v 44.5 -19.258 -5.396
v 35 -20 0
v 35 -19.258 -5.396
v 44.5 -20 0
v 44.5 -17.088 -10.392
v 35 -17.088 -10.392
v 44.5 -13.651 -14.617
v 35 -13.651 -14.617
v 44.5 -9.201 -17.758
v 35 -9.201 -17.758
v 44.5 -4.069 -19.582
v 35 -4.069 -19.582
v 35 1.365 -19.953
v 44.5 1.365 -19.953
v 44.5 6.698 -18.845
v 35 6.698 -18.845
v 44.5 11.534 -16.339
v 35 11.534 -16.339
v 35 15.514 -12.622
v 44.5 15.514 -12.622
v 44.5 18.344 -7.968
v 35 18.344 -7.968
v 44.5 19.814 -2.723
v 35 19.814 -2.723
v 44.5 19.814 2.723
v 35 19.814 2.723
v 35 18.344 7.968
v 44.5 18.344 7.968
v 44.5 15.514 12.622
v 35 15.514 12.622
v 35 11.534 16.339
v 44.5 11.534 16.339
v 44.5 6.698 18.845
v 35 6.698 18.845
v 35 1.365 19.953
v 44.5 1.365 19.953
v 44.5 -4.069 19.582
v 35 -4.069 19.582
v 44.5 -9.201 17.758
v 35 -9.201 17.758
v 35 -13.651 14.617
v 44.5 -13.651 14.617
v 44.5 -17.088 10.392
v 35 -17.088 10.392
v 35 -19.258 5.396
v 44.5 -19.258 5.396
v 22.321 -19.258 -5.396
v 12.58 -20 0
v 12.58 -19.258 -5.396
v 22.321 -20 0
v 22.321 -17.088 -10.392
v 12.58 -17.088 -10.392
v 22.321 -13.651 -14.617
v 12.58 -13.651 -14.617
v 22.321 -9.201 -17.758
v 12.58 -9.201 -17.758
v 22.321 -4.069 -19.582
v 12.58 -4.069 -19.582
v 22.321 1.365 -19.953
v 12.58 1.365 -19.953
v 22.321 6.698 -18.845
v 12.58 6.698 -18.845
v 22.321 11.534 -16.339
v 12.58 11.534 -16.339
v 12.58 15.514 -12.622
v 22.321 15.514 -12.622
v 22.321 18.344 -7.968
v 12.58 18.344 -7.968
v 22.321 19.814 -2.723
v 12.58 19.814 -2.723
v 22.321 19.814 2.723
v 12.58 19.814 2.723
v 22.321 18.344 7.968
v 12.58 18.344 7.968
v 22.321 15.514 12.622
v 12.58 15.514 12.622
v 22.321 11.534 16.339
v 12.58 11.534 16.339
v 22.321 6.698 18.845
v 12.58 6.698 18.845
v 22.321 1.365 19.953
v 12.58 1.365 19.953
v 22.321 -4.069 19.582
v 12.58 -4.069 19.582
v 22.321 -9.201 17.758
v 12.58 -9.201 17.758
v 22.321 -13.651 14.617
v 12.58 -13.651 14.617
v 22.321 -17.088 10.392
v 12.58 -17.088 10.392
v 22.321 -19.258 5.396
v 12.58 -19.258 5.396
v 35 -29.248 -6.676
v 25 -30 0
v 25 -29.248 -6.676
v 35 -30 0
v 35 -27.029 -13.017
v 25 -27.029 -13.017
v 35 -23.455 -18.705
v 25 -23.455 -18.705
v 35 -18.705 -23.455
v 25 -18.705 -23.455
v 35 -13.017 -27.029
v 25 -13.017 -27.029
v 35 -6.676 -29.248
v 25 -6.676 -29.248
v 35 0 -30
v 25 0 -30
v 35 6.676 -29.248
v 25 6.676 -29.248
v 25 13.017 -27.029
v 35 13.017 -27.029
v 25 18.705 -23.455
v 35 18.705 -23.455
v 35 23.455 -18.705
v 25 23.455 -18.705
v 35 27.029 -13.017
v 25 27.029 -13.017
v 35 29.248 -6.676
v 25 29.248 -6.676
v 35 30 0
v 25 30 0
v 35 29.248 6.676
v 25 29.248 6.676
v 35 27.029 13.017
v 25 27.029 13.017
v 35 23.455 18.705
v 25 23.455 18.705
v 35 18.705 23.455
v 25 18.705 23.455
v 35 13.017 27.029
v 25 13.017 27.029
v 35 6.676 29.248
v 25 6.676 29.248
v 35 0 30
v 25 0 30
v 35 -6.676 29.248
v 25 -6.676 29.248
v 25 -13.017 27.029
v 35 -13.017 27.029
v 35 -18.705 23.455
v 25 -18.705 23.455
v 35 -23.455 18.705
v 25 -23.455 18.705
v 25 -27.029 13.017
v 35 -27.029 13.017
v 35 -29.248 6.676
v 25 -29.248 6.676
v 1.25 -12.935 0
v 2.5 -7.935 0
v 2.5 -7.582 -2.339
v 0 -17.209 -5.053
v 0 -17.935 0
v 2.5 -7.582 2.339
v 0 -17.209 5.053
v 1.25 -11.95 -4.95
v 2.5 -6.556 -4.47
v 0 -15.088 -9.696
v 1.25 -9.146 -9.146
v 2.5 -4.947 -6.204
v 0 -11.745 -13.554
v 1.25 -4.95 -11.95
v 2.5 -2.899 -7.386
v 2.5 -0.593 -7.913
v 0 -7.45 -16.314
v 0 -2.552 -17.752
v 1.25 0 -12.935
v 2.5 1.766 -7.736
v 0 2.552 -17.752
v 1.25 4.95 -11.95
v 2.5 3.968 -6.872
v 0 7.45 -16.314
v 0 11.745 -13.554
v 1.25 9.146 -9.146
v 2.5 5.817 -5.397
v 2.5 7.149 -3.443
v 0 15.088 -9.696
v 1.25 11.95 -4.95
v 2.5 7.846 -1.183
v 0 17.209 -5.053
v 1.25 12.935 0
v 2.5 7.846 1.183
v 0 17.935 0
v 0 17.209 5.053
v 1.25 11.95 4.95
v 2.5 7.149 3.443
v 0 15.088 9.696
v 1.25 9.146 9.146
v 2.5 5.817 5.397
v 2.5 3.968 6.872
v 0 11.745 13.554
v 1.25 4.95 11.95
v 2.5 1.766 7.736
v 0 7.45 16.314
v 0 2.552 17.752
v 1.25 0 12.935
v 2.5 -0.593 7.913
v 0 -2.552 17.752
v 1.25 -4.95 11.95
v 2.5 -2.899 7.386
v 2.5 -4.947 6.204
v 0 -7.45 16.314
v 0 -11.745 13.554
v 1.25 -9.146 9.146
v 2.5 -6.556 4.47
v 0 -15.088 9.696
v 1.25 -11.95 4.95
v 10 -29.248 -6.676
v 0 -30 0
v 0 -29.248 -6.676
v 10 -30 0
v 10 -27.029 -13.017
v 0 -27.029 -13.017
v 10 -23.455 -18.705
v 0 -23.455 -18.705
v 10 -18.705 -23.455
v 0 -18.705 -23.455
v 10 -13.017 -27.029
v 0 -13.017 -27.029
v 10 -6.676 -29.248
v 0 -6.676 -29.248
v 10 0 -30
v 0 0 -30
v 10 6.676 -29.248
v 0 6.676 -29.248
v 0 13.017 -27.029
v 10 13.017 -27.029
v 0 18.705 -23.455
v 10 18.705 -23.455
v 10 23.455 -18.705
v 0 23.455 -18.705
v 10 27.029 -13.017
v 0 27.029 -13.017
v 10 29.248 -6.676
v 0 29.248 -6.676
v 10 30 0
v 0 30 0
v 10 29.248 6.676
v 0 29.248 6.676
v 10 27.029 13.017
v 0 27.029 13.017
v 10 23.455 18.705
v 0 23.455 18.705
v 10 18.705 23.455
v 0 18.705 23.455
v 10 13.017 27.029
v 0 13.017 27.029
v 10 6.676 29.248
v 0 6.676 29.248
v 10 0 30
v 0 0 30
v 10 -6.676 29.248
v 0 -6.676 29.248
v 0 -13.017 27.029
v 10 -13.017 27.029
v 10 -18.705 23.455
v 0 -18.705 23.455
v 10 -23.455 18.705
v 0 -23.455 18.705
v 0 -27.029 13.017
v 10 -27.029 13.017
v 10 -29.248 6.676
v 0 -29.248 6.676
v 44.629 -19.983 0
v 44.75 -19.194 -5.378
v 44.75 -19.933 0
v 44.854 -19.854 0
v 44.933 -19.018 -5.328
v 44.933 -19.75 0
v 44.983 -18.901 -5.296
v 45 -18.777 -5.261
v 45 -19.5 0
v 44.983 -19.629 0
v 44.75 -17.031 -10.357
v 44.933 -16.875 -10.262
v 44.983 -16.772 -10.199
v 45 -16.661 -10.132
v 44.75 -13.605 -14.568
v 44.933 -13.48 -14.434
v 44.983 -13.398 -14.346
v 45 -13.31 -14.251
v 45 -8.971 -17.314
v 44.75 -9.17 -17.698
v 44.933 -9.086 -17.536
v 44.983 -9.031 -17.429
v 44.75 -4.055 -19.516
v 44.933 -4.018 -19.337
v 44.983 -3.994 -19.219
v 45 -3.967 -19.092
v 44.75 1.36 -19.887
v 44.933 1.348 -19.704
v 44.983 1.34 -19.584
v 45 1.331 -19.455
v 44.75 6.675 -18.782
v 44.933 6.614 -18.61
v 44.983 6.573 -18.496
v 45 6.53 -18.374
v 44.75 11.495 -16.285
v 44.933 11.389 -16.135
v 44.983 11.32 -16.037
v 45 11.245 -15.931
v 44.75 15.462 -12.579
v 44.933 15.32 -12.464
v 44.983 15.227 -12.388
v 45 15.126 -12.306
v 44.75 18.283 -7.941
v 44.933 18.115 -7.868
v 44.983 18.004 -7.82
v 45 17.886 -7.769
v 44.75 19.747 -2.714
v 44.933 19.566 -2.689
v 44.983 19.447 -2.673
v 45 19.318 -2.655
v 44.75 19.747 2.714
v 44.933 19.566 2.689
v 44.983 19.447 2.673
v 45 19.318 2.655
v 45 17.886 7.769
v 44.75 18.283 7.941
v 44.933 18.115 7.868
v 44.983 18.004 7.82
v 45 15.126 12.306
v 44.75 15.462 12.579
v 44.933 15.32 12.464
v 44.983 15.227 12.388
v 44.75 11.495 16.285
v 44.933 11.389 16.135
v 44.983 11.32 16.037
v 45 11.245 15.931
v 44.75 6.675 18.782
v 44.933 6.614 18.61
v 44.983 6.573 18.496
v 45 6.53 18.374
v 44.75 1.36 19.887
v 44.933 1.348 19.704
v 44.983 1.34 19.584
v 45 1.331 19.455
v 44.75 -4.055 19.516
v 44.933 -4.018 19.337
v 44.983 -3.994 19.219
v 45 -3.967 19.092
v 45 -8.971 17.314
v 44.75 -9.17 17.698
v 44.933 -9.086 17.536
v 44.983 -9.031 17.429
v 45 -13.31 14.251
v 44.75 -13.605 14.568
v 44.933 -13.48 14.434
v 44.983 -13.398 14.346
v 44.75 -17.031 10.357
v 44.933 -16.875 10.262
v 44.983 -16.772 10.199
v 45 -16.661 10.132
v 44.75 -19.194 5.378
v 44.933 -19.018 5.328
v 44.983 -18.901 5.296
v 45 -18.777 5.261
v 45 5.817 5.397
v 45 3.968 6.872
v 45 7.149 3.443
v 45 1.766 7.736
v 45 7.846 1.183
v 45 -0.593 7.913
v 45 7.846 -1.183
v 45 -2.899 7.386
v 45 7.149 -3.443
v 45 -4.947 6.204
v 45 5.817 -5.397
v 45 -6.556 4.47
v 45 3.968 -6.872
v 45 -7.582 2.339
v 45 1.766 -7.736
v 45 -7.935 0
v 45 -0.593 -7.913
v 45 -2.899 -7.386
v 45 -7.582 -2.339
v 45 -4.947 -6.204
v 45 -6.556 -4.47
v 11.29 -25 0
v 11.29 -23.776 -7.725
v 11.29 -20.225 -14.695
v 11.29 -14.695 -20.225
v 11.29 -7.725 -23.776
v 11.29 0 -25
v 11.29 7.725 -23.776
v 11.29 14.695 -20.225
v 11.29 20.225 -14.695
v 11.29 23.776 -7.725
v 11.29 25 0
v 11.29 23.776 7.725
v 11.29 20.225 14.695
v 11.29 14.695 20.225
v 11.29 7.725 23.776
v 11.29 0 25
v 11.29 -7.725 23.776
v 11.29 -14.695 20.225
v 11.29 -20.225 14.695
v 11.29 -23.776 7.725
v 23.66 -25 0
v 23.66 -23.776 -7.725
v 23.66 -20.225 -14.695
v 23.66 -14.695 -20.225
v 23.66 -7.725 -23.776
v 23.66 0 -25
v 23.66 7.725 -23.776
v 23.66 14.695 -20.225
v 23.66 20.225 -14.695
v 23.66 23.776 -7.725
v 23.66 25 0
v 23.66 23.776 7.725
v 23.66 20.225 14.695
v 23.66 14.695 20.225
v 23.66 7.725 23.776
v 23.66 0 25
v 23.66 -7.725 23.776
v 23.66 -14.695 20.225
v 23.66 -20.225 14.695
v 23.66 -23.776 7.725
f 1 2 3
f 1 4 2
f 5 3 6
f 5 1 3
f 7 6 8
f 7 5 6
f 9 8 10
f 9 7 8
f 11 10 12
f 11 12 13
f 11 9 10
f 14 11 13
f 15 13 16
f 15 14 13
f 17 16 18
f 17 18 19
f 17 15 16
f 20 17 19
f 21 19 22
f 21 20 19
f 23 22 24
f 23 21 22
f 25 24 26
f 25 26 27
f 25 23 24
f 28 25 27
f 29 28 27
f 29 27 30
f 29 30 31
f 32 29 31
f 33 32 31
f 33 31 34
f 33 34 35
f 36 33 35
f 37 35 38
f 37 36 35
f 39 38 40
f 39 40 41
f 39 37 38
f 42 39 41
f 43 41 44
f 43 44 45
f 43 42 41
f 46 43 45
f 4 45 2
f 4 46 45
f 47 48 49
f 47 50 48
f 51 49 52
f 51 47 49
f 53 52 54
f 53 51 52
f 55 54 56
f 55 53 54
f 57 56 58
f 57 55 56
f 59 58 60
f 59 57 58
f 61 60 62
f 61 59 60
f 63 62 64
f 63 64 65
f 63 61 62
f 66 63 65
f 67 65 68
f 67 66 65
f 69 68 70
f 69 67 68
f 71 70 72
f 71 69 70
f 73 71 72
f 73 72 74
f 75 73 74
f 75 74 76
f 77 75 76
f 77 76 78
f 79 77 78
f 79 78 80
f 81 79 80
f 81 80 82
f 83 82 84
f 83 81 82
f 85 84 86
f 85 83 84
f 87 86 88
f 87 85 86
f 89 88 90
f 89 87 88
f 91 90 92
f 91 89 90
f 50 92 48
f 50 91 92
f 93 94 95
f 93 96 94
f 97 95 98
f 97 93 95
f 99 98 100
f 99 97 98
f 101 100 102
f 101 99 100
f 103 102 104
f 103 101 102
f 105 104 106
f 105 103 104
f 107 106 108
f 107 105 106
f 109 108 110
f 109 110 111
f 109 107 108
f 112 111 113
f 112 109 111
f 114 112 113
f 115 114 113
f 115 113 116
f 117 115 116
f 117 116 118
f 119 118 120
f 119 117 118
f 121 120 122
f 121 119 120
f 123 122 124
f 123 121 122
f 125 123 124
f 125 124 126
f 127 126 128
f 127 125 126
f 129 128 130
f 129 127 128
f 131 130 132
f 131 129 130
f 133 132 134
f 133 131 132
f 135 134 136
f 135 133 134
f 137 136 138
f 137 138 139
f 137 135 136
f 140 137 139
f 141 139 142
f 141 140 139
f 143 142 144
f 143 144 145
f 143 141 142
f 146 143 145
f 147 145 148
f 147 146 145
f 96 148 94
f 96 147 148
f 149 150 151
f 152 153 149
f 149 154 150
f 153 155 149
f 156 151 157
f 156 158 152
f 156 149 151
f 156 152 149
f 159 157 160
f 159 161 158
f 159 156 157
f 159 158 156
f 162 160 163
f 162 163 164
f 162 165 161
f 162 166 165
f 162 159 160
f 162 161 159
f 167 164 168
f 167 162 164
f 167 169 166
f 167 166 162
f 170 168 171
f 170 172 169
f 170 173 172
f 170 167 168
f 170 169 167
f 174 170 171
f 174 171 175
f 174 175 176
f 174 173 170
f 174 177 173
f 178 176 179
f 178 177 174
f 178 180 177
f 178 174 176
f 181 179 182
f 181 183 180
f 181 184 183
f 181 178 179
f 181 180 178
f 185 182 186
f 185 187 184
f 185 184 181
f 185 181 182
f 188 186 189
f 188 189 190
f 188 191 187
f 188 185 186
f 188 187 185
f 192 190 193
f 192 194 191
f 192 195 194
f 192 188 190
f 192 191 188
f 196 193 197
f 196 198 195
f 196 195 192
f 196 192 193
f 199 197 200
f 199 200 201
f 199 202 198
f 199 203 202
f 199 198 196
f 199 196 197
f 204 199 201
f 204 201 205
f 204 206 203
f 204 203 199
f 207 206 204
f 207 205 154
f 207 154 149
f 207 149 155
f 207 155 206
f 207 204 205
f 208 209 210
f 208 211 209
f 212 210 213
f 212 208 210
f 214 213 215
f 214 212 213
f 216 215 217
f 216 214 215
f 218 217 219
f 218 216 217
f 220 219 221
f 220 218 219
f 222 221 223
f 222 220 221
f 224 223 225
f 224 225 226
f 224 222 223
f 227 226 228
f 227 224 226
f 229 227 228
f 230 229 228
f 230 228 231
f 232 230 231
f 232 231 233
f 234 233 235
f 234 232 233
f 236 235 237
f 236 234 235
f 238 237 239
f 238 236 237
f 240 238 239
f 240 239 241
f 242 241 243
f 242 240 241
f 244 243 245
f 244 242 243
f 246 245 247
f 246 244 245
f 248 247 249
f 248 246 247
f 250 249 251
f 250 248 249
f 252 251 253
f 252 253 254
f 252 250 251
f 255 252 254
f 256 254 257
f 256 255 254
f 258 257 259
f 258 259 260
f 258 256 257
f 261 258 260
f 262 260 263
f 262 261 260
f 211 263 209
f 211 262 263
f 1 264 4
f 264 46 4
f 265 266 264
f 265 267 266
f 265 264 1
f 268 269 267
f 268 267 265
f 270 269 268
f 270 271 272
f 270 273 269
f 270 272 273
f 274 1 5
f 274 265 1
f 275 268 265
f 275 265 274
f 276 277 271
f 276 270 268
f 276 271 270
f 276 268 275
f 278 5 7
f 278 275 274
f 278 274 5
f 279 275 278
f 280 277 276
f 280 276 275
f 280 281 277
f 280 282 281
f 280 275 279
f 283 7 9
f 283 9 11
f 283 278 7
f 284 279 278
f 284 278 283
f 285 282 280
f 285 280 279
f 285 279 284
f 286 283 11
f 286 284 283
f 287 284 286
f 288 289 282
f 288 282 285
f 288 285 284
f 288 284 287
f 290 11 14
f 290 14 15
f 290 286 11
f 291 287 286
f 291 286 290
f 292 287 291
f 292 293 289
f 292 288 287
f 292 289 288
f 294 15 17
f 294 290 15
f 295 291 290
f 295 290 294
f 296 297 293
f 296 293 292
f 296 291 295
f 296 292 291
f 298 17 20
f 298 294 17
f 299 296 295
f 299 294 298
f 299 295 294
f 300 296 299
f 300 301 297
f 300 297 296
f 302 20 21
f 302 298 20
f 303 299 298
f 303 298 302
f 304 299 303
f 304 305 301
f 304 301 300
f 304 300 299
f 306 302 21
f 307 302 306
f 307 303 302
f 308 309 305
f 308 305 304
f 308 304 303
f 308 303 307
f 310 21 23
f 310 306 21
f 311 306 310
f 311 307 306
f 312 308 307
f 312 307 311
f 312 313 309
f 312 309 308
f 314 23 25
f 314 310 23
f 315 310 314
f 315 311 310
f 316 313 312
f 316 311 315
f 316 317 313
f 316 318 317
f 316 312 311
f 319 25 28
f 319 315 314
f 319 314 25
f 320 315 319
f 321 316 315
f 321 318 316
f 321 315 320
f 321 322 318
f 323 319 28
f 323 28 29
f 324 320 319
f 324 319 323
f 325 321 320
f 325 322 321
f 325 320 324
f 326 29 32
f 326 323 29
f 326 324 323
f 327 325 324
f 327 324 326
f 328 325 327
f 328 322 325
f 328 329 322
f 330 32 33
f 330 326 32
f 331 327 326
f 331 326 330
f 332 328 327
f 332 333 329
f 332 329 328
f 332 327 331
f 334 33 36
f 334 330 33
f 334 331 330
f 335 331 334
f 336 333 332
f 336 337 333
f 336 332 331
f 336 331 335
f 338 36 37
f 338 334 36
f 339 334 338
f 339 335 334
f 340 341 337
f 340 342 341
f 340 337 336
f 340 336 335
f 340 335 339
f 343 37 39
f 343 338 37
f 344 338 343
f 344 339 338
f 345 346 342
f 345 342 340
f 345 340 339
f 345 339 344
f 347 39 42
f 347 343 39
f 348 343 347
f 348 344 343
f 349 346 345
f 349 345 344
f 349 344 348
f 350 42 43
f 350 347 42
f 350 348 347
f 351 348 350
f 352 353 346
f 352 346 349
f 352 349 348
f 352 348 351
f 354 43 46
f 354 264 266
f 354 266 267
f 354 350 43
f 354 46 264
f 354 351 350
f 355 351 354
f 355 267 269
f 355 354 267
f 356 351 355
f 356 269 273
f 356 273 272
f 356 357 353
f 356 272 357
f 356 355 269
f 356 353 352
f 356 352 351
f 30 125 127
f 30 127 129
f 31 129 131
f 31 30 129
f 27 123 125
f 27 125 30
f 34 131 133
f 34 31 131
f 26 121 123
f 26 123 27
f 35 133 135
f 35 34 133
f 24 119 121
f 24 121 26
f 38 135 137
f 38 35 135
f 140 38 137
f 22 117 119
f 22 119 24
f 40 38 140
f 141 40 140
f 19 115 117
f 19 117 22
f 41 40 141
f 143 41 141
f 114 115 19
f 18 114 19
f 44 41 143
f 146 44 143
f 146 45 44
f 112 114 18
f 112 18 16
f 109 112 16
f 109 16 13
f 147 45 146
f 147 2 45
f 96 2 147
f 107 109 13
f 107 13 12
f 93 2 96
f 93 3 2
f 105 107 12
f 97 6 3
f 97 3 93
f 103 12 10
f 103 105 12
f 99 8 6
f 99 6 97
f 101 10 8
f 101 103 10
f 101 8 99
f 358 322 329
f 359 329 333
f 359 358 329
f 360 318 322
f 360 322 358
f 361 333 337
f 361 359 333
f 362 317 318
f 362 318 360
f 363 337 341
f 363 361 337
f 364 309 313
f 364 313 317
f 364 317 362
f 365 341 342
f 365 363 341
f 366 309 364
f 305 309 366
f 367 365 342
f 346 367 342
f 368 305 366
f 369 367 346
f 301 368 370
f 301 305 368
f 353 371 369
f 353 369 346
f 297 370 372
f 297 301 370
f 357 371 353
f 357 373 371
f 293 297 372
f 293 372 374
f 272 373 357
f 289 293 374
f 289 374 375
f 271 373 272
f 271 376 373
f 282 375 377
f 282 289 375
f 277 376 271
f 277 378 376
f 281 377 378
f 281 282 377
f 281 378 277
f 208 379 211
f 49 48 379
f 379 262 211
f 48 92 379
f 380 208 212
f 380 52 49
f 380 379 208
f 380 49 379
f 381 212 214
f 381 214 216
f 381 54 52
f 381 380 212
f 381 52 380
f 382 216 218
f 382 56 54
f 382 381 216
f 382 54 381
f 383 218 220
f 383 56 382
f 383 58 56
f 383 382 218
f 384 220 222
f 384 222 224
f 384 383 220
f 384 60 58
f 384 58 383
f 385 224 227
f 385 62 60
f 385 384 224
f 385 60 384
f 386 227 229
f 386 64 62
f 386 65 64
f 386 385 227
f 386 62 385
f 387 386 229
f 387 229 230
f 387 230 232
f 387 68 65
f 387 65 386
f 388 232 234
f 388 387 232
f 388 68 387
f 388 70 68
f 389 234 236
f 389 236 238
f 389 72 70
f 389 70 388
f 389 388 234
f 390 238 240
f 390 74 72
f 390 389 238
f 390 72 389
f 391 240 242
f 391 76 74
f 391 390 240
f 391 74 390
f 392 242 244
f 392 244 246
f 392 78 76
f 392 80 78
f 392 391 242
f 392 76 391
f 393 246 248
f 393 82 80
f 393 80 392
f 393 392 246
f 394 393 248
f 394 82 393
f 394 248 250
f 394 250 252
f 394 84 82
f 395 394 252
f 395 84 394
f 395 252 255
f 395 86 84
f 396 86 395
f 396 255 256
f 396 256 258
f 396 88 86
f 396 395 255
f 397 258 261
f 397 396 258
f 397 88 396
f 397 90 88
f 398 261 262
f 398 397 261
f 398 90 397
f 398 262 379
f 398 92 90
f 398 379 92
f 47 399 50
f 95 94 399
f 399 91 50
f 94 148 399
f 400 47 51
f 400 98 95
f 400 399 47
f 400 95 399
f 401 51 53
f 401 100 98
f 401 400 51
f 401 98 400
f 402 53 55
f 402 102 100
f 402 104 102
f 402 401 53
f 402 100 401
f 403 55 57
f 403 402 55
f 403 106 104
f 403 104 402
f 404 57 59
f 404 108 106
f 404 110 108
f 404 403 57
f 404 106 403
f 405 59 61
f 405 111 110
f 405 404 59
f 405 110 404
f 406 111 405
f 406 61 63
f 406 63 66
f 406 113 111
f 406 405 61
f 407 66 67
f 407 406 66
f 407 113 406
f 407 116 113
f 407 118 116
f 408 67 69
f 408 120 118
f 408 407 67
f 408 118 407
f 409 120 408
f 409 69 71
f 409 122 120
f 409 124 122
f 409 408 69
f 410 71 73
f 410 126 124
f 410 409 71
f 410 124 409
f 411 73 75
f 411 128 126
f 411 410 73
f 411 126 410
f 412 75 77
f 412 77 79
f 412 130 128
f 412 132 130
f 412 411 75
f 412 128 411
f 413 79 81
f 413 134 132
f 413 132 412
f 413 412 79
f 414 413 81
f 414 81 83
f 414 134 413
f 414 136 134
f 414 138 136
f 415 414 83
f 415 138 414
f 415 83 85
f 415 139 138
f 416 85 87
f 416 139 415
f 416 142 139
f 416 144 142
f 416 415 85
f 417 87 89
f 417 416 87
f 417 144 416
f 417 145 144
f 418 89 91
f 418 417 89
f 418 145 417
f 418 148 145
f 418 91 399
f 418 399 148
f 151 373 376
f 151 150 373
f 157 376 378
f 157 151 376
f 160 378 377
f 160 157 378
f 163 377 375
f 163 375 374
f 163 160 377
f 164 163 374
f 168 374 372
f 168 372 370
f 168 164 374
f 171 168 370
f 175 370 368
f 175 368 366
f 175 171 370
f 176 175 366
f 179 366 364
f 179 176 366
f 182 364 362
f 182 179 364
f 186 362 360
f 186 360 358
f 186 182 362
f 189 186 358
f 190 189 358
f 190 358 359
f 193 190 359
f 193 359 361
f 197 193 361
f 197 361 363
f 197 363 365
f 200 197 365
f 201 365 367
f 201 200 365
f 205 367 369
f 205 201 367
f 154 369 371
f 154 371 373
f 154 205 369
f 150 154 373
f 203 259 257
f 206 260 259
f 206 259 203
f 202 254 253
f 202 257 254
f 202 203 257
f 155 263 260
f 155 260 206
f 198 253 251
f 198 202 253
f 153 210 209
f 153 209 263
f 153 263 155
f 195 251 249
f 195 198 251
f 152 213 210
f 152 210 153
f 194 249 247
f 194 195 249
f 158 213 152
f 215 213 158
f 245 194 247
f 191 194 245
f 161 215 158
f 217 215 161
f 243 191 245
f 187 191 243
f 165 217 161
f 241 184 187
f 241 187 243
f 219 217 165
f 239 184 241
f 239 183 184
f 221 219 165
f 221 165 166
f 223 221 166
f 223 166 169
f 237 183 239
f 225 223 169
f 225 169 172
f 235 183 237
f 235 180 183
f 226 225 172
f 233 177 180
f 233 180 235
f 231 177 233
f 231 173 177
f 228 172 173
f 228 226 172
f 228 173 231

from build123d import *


with BuildPart() as part:
    # Sketch1 → Revolve1 (revolve)
    with BuildSketch(Plane.XY):
        with BuildLine():
            Line((0, -17.935), (0, -30))
            Line((0, -30), (10, -30))
            Line((10, -30), (12.580192505, -20))
            Line((12.580192505, -20), (22.320508076, -20))
            Line((22.320508076, -20), (25, -30))
            Line((25, -30), (35, -30))
            Line((35, -30), (35, -20))
            Line((35, -20), (44.5, -20))
            ThreePointArc((44.5, -20), (44.853553391, -19.853553391), (45, -19.5))
            Line((45, -19.5), (45, -7.935))
            Line((45, -7.935), (2.5, -7.935))
            Line((2.5, -7.935), (0, -17.935))
        make_face()
    revolve(axis=Axis((0, 0, 0), (1, 0, 0)))


solid = part.part
